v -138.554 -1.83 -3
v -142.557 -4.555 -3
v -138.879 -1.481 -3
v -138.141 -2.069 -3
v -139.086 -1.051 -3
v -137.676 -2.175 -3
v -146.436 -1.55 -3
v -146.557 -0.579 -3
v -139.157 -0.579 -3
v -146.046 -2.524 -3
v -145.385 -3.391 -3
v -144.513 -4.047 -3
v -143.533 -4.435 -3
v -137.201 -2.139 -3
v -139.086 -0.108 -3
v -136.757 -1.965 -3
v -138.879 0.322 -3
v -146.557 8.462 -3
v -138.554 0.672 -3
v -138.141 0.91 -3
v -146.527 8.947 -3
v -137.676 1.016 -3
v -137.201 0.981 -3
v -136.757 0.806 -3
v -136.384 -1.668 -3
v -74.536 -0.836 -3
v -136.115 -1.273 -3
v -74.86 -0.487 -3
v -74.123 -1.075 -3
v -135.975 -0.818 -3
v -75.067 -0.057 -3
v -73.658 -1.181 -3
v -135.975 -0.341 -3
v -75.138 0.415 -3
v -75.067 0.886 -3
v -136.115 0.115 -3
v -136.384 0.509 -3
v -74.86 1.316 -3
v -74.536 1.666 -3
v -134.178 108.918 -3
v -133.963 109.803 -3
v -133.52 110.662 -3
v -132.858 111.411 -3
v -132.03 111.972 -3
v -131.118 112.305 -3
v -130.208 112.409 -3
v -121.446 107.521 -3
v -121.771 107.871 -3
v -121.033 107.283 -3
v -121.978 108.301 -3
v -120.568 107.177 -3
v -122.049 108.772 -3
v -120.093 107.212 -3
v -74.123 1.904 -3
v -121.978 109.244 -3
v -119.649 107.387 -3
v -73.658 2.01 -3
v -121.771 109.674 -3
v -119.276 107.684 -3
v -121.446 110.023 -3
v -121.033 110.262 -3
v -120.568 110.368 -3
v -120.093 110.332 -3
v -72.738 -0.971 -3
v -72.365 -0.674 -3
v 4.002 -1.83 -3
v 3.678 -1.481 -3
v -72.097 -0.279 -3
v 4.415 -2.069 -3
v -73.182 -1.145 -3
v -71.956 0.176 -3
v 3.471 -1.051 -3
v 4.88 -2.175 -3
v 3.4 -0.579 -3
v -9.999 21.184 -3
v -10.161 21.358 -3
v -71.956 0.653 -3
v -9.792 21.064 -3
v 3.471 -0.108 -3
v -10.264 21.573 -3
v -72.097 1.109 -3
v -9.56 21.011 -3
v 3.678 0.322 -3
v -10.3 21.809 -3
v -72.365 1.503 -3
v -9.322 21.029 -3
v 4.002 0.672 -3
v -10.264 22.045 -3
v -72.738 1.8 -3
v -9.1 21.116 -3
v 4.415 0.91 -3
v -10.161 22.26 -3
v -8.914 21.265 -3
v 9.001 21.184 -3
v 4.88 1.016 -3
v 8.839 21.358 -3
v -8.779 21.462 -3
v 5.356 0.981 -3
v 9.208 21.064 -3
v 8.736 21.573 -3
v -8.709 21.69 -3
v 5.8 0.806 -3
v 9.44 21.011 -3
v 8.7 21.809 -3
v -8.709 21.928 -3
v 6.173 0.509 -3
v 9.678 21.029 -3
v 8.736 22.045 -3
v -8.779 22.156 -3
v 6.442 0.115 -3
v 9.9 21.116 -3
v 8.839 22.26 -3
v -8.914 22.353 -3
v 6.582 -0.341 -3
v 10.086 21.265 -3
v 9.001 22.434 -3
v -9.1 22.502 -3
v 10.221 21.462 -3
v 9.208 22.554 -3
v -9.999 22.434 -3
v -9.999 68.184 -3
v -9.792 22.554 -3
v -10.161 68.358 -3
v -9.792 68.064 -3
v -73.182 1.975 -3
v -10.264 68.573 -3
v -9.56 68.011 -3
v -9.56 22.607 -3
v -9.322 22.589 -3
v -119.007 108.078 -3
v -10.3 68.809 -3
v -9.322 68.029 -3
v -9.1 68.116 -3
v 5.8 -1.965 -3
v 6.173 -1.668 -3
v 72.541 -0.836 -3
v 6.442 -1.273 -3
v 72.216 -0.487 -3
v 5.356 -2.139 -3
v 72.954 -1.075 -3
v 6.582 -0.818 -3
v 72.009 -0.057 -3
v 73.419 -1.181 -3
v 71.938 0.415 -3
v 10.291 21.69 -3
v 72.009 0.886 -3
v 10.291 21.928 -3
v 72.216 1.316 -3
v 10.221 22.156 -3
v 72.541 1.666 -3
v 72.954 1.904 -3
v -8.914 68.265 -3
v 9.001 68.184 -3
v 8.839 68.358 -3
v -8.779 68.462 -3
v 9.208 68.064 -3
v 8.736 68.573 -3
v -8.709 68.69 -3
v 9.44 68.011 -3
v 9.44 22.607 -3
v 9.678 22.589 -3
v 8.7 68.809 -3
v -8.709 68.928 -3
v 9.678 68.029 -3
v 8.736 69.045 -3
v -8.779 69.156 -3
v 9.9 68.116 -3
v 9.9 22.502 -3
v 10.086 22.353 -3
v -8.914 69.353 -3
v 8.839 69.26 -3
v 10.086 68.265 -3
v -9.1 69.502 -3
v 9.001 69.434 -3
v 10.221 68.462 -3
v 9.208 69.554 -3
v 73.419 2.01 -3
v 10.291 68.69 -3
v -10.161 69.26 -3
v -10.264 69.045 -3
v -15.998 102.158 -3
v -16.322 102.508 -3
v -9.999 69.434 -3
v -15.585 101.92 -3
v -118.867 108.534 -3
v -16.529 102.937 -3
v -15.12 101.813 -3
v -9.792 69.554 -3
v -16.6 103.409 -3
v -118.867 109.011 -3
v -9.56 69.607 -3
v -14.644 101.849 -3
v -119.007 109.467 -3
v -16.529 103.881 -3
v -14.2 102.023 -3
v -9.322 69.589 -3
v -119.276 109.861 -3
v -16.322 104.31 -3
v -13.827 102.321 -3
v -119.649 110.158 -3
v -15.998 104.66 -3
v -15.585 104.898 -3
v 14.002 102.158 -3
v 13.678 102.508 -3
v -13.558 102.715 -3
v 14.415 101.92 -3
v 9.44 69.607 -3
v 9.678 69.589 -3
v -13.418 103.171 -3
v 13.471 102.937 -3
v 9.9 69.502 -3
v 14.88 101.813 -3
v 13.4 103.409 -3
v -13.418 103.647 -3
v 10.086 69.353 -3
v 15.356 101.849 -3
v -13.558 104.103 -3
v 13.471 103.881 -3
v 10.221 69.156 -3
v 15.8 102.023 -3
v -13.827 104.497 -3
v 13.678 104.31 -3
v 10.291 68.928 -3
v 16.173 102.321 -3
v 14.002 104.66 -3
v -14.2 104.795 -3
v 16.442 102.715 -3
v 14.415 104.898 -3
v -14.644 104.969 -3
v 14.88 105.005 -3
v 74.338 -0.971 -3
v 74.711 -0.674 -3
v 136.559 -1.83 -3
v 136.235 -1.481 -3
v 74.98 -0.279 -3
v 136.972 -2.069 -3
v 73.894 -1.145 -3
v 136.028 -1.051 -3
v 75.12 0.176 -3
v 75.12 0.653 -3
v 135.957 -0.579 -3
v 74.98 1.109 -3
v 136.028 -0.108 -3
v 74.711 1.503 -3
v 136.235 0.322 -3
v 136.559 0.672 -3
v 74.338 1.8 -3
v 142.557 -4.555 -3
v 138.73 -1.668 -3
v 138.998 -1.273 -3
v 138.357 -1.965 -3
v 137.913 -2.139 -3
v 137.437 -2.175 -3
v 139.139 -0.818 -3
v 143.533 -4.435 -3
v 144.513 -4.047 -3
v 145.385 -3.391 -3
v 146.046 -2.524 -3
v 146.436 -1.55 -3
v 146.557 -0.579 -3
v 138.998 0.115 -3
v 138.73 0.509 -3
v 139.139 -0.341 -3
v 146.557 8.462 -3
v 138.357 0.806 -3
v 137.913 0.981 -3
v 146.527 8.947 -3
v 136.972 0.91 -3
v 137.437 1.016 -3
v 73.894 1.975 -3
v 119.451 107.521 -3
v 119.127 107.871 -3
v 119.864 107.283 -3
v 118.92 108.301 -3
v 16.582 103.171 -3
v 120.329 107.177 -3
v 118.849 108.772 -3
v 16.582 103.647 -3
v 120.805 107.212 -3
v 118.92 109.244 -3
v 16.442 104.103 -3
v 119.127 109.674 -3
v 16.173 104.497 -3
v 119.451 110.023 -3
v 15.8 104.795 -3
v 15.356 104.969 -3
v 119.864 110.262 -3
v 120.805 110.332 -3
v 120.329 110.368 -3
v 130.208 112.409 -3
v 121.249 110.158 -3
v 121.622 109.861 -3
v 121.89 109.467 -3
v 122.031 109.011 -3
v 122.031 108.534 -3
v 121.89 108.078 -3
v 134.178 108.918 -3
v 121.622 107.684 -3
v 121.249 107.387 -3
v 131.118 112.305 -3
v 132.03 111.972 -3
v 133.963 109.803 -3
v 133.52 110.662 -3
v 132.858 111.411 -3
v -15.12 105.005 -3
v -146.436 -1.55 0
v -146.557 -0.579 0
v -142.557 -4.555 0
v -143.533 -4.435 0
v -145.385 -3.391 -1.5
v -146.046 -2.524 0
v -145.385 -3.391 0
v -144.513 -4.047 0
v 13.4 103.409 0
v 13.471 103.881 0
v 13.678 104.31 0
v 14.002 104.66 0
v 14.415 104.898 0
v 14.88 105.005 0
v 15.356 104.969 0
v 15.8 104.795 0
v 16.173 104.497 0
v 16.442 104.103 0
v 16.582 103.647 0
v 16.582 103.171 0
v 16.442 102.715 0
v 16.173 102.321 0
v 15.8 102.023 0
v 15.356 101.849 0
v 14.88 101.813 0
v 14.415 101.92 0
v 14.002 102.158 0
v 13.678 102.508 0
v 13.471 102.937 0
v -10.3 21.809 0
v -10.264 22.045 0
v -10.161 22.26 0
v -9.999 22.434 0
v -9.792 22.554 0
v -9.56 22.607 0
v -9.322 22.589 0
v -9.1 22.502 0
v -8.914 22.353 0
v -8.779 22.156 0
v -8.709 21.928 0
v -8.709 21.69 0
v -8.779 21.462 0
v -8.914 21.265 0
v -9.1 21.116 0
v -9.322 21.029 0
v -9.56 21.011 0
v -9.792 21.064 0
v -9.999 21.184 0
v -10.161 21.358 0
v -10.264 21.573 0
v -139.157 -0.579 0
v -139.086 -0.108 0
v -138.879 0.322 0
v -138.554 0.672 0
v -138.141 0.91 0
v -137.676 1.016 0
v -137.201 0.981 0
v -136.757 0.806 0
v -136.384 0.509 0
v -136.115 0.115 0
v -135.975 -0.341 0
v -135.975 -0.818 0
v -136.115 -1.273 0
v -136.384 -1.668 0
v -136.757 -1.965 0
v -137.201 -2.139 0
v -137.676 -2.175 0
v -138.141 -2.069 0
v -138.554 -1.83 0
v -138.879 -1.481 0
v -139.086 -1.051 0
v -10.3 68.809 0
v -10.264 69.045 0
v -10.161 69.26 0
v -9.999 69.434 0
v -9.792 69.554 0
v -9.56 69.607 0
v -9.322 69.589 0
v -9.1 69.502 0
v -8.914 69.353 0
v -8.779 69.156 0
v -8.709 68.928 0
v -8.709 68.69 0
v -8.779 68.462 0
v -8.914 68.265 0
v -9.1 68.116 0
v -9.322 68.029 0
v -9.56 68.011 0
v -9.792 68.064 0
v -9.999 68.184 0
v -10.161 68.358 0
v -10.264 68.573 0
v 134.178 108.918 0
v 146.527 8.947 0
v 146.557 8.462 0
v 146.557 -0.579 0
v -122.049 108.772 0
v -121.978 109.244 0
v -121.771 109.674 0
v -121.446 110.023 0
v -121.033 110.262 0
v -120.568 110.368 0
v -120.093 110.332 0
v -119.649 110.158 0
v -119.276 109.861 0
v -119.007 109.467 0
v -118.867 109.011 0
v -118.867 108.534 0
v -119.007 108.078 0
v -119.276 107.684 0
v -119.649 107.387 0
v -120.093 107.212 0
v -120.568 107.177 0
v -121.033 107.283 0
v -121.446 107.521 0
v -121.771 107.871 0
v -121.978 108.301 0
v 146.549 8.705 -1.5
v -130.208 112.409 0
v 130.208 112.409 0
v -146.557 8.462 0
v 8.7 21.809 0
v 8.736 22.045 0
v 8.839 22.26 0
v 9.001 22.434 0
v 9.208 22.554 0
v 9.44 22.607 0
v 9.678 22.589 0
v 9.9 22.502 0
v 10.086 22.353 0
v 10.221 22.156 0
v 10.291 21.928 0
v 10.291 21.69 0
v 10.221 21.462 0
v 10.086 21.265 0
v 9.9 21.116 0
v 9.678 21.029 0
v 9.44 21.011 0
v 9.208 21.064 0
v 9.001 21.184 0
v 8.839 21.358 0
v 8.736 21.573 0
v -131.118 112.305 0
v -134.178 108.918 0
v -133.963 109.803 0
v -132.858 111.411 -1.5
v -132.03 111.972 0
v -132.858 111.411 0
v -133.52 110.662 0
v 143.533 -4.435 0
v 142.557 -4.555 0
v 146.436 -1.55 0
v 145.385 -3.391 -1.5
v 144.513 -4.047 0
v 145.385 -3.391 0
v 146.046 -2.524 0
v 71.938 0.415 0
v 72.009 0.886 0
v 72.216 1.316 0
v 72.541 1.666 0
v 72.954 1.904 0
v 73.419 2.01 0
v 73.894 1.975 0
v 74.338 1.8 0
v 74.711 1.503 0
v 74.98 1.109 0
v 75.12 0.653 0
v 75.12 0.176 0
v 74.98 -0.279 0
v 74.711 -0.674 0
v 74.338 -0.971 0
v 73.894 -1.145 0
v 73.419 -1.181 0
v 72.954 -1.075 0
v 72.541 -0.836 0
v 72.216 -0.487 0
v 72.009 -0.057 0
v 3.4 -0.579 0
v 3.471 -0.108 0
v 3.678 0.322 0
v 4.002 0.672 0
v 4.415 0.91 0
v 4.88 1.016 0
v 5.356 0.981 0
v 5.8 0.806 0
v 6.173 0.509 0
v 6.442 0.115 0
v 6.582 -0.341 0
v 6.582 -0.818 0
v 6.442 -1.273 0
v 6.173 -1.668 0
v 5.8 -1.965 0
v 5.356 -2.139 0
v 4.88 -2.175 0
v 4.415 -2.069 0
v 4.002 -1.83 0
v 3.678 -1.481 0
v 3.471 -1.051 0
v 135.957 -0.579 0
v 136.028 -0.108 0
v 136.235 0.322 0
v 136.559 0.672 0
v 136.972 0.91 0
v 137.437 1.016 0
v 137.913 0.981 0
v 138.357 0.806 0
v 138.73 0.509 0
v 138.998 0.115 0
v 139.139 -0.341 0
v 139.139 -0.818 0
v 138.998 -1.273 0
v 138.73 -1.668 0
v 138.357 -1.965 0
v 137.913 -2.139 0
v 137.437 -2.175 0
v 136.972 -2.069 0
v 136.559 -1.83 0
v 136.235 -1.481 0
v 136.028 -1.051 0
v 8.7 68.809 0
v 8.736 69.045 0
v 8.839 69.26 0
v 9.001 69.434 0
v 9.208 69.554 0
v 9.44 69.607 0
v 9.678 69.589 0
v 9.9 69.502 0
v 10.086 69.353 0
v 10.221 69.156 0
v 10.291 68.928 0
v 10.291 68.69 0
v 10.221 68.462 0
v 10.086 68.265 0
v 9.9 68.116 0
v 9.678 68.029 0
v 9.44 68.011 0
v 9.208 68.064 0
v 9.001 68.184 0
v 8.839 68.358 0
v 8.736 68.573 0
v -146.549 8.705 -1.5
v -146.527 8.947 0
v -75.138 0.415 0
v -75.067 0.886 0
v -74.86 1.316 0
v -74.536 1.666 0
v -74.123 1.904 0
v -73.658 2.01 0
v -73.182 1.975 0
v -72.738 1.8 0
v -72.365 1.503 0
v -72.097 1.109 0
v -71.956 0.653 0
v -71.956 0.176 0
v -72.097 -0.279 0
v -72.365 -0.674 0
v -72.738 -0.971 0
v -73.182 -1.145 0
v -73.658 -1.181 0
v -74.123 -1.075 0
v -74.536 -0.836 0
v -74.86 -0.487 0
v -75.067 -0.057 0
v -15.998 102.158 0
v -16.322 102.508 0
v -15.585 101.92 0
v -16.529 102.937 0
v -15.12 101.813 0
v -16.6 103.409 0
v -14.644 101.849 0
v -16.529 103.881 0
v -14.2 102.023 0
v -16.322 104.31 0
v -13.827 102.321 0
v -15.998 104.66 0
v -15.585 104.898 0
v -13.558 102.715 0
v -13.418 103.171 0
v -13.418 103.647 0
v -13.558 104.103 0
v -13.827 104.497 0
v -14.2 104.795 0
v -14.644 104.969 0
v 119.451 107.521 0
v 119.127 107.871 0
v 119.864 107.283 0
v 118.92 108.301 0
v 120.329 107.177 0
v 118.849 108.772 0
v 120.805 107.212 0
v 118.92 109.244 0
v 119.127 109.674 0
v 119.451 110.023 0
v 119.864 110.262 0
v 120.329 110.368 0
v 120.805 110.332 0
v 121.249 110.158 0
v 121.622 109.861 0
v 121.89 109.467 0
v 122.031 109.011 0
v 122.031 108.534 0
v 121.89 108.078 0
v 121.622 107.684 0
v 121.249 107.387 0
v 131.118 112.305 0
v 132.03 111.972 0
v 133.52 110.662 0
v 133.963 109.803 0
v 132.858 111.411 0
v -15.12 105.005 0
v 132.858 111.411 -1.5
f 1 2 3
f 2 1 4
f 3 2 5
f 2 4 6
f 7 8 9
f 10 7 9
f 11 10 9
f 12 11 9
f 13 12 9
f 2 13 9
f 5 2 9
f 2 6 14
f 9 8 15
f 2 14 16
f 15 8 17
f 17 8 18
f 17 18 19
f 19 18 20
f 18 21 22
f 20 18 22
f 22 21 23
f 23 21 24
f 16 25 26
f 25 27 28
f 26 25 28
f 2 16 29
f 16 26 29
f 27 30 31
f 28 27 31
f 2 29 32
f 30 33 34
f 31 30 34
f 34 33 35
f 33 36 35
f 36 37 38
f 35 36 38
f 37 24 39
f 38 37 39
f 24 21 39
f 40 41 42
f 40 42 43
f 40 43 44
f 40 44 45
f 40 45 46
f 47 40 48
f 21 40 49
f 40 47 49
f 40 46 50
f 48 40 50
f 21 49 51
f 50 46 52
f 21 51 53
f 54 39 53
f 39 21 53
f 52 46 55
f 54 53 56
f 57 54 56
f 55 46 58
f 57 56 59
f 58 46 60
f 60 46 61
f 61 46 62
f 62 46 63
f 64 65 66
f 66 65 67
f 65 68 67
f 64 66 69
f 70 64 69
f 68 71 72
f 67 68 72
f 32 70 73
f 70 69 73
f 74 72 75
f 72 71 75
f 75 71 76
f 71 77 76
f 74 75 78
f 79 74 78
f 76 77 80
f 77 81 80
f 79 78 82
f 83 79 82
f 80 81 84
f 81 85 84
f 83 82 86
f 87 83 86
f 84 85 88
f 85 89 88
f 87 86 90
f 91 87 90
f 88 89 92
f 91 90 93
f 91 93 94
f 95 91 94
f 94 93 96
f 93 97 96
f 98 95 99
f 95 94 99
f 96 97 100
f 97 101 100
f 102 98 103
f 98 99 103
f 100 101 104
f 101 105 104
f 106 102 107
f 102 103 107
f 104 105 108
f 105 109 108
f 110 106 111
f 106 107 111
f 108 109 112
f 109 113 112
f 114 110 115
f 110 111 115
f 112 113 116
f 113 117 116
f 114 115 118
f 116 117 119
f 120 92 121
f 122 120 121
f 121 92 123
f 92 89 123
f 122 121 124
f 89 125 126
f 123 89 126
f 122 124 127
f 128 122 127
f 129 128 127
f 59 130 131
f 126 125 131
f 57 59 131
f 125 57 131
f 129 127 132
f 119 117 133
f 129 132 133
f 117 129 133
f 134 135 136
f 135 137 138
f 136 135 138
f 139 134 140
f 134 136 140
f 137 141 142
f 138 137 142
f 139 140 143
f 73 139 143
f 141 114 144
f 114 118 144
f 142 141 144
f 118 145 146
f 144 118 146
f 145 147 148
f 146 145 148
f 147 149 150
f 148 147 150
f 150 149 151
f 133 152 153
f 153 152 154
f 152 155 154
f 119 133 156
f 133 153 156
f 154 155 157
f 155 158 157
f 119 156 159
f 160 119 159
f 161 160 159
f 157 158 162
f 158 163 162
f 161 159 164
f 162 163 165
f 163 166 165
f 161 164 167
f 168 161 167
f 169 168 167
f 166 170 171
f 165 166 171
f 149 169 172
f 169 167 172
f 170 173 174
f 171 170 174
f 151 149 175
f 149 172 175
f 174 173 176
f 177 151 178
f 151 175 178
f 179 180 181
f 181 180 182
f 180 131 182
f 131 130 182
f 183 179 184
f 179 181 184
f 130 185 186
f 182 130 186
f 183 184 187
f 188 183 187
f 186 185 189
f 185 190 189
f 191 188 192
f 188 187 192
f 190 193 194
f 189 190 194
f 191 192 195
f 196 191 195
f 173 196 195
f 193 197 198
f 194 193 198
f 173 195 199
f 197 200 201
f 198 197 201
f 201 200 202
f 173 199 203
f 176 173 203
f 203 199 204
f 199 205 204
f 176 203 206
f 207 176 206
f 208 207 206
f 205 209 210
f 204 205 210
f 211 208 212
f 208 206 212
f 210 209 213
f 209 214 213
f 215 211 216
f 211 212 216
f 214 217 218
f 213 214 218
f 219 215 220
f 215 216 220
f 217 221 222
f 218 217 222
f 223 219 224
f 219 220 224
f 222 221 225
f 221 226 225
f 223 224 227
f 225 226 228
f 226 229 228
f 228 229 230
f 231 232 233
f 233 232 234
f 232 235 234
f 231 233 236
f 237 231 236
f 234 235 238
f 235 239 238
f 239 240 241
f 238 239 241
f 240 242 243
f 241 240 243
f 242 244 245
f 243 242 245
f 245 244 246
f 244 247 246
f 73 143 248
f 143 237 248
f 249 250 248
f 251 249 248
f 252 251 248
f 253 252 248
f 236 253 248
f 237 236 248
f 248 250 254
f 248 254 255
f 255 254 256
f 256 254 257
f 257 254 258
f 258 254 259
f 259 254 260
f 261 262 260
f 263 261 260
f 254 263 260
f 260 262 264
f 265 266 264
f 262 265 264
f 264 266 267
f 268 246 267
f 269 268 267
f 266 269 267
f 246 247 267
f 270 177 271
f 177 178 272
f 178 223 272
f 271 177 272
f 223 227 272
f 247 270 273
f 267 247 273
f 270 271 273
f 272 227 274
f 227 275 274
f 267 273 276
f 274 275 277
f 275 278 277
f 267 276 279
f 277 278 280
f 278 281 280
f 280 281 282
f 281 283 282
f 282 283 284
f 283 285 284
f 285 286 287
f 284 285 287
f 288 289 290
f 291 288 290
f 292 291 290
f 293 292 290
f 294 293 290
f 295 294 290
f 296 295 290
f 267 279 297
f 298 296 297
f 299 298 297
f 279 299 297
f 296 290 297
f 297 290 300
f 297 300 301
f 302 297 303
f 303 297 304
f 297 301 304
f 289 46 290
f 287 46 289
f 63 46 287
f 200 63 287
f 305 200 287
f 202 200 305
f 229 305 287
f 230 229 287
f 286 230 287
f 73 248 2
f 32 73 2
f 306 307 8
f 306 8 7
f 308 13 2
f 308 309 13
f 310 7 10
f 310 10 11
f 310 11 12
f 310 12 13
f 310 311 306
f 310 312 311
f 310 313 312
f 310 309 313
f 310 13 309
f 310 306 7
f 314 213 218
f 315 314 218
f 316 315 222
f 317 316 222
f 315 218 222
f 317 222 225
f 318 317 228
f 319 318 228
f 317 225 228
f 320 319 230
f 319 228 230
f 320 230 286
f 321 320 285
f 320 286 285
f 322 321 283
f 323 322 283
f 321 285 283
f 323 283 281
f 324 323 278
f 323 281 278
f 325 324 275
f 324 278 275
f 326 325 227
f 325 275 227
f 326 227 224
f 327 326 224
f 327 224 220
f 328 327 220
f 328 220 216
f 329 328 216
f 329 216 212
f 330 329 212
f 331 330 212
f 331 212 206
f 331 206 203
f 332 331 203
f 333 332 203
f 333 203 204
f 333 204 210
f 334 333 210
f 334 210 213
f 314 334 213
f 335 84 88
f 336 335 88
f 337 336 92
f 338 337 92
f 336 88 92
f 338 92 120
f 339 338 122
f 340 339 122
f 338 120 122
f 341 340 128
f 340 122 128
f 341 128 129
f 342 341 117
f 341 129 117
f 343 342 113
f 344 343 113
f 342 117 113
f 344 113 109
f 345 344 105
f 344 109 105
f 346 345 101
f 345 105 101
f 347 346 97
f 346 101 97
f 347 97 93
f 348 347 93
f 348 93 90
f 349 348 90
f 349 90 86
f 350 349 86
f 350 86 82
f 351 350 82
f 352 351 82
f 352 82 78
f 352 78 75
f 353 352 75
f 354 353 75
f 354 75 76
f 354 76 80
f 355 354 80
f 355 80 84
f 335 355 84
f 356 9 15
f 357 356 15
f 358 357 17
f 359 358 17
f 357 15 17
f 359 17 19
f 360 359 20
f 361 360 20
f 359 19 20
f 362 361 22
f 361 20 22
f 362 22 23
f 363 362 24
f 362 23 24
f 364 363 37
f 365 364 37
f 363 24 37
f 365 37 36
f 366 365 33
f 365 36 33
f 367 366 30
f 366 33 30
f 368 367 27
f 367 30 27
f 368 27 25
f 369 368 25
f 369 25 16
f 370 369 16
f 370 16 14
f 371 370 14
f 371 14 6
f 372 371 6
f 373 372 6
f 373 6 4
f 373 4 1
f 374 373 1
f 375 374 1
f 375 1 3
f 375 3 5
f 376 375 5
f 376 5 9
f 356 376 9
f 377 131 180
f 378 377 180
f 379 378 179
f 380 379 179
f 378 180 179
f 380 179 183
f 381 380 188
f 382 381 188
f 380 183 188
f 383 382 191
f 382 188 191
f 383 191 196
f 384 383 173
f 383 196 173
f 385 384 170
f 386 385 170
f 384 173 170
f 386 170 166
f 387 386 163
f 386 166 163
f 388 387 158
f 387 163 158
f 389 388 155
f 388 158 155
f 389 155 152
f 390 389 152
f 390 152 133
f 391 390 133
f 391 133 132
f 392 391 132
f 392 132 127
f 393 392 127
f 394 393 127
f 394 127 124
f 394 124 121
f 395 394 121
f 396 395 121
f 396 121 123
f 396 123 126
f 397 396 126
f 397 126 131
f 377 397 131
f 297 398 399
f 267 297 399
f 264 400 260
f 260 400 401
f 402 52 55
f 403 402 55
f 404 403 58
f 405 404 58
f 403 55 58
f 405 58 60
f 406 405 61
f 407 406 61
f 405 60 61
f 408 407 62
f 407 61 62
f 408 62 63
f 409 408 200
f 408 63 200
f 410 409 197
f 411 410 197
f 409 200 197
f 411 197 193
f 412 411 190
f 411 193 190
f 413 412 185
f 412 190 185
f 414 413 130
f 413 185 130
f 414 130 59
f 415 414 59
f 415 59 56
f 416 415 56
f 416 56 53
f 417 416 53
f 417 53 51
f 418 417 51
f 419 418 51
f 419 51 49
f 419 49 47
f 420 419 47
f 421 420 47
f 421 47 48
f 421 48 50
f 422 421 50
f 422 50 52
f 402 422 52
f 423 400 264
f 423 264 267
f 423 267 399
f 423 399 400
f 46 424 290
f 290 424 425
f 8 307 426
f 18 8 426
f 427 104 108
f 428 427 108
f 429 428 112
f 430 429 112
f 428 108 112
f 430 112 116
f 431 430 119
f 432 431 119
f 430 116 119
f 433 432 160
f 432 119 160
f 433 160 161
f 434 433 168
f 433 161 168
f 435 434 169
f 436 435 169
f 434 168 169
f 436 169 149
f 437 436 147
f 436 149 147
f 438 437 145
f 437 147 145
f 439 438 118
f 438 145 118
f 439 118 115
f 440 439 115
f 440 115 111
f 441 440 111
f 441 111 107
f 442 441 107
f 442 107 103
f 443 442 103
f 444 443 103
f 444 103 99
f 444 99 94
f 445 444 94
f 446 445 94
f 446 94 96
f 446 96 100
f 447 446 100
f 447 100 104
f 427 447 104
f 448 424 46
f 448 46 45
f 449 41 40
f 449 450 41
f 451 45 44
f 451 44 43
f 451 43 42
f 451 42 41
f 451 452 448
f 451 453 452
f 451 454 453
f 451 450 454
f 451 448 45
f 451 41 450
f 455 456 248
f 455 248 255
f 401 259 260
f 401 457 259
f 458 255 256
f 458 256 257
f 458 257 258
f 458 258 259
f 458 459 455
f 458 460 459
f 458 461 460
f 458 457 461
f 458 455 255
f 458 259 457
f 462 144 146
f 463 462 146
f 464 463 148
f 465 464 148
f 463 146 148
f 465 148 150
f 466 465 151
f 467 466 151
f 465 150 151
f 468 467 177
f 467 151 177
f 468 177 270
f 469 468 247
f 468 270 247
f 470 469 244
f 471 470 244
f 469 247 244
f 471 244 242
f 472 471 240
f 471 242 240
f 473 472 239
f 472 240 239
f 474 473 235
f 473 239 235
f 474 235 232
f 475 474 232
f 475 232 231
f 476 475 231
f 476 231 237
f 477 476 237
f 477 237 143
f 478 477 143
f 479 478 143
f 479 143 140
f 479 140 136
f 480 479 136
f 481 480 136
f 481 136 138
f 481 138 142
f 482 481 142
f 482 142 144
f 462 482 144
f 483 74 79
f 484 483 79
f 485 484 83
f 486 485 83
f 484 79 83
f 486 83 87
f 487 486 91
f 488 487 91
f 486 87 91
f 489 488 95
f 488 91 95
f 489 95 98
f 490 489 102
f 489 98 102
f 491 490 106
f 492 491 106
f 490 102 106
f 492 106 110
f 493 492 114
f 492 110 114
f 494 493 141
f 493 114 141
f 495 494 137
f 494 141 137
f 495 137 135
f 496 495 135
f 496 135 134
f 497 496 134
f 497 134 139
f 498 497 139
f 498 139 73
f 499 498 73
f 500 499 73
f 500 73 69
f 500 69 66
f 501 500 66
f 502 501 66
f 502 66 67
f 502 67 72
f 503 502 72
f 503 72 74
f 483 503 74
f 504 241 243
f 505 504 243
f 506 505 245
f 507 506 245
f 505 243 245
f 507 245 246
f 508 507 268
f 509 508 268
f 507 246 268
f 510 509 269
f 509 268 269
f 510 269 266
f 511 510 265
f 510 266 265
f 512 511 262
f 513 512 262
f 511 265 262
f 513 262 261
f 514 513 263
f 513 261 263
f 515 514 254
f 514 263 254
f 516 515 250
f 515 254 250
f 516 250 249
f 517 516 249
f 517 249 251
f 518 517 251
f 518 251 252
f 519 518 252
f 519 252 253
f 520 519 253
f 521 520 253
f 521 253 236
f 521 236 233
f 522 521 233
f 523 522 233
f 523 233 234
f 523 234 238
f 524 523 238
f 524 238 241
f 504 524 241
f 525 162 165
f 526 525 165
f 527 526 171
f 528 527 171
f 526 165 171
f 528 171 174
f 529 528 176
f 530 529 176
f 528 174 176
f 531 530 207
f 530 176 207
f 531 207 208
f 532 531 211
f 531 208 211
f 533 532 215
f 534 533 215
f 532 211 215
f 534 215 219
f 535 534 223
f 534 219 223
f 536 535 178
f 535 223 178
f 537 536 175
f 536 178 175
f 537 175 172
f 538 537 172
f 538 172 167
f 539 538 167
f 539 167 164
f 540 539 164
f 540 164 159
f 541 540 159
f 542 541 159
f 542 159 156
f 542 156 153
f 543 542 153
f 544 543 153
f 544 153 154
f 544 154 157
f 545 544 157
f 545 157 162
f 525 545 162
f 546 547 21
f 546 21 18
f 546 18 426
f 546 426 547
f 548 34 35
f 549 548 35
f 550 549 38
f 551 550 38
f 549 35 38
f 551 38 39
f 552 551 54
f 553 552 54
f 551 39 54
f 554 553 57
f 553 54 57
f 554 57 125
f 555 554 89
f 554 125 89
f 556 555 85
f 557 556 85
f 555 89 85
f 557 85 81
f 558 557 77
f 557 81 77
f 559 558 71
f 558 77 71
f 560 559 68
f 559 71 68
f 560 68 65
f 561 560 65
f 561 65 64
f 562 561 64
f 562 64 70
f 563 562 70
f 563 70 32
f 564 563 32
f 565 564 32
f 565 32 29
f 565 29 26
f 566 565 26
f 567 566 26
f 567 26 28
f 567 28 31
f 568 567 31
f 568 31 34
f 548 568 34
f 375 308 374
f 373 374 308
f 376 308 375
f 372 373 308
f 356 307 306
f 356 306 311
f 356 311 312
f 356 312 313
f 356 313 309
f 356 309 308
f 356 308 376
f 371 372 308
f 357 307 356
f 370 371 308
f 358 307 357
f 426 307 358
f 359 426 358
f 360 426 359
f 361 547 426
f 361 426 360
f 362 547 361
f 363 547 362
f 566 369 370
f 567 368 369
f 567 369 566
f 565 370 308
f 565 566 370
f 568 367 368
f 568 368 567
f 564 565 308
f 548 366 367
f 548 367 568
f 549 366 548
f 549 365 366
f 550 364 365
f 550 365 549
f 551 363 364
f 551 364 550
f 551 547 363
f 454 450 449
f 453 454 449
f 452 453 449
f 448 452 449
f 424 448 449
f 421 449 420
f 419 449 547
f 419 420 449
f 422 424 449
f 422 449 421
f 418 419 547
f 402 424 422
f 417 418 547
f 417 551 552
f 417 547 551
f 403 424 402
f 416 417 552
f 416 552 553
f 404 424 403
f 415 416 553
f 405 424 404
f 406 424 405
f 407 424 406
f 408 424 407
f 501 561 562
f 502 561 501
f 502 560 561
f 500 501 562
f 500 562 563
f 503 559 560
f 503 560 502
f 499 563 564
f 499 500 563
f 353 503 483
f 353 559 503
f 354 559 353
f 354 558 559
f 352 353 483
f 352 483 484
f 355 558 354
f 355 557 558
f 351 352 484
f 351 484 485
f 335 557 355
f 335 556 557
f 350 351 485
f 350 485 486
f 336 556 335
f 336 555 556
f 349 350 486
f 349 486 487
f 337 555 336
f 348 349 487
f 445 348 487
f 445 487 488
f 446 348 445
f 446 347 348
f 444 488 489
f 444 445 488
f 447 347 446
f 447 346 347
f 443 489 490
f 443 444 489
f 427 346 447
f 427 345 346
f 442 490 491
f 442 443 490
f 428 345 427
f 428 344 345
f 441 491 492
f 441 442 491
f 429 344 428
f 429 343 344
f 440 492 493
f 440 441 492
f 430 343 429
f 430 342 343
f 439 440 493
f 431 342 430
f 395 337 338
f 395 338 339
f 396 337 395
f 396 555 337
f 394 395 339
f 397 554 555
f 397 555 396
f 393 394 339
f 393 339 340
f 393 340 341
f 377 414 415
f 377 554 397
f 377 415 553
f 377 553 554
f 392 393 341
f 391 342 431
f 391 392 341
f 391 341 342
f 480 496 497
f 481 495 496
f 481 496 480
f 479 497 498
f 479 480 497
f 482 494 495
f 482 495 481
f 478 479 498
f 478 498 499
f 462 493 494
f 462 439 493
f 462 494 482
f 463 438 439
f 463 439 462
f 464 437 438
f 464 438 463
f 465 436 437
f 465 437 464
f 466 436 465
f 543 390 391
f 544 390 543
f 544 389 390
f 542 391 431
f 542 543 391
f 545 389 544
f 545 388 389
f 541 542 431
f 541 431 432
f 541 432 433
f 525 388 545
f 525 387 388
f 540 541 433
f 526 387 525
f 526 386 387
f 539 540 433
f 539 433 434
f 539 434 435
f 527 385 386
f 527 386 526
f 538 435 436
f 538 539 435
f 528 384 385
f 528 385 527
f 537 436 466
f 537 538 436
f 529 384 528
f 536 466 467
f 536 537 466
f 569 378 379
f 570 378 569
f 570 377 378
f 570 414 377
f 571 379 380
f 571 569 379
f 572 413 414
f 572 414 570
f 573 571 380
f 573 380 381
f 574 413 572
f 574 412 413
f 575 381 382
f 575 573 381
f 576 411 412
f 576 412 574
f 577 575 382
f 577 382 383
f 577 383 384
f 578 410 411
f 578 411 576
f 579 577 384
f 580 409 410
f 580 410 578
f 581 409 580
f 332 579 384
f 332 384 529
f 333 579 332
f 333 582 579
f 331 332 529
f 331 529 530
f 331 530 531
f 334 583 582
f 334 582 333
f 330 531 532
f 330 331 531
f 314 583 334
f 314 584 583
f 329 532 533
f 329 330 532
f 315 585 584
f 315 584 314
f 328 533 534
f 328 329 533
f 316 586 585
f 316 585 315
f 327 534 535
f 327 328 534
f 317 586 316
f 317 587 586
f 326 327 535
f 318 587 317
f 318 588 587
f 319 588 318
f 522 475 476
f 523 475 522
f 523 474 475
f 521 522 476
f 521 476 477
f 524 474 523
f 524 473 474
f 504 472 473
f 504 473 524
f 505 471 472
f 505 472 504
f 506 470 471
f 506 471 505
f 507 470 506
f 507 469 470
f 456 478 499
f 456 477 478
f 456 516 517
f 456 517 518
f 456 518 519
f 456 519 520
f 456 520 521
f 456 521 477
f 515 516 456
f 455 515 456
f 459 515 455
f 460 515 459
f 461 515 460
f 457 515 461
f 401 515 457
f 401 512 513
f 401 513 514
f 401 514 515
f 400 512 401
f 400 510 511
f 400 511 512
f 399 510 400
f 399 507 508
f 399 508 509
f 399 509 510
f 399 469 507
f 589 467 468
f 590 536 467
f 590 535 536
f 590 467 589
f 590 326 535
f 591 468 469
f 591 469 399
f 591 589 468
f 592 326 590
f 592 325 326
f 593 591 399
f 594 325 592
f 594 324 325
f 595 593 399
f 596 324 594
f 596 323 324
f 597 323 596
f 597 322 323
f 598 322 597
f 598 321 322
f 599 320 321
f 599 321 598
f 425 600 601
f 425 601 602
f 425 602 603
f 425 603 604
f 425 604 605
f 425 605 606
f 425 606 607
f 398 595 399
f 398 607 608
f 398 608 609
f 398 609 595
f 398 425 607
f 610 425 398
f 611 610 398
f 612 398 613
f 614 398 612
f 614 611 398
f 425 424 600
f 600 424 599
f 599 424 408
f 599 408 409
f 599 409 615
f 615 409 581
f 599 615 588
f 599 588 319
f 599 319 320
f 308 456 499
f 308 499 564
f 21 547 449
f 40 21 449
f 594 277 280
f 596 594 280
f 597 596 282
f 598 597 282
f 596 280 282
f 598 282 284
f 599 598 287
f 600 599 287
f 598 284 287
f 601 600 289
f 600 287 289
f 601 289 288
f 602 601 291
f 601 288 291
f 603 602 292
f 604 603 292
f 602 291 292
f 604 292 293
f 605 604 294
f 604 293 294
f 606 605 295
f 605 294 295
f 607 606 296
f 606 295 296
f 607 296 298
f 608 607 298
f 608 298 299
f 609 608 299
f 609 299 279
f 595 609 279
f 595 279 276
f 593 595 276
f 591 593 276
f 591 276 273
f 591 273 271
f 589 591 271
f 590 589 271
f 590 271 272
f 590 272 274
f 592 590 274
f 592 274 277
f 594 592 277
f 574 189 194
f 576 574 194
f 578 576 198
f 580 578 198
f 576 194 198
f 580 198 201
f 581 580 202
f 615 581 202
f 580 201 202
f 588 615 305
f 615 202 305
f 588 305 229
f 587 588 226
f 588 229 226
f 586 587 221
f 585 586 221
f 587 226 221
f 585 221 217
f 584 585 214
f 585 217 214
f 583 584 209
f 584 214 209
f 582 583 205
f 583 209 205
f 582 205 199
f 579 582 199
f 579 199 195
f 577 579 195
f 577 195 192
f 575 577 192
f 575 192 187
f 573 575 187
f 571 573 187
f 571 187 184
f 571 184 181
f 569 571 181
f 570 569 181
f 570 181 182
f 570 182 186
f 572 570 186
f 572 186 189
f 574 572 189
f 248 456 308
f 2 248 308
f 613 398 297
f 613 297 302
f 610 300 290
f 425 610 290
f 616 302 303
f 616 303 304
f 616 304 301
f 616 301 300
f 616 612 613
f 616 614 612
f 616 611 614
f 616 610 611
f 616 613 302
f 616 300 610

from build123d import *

# Parameters (mm, degrees)
BOSS_EXTRUDE1_DEPTH            = 3
F_3_2_3_2_DIAMETER_HOLE1_D     = 3.2
F_3_2_3_2_DIAMETER_HOLE1_DEPTH = 15
F_3_2_3_2_DIAMETER_HOLE1_TIP   = 0.96137699
F_1_6_1_6_DIAMETER_HOLE1_D     = 1.6
F_1_6_1_6_DIAMETER_HOLE1_DEPTH = 15
F_1_6_1_6_DIAMETER_HOLE1_TIP   = 0.480688495


with BuildPart() as part:
    # Sketch1 → Boss-Extrude1 (new body)
    with BuildSketch(Plane.XY):
        with BuildLine():
            Line((-11.618950039, 112.409005395), (11.618950039, 112.409005395))
            Line((11.618950039, 112.409005395), (130.207854482, 112.409005395))
            add(Edge.make_bspline(
                [(134.178039088, 108.917568146), (133.74675554, 112.409005395), (130.207854482, 112.409005395)],
                knots=[0.122173048, 0.122173048, 0.122173048, 1.570796327, 1.570796327, 1.570796327], degree=2, weights=[1, 0.748955721, 1]))
            Line((134.178039088, 108.917568146), (146.527006833, 8.947035697))
            add(Edge.make_bspline(
                [(146.556822227, 8.462484609), (146.556822227, 8.705666473), (146.527006833, 8.947035697)],
                knots=[0, 0, 0, 0.122173048, 0.122173048, 0.122173048], degree=2, weights=[1, 0.998134798, 1]))
            Line((146.556822227, 8.462484609), (146.556822227, -0.579261565))
            add(Edge.make_bspline(
                [(142.556822227, -4.555249901), (146.556822227, -4.555249901), (146.556822227, -0.579261565)],
                knots=[4.71238898, 4.71238898, 4.71238898, 6.283185307, 6.283185307, 6.283185307], degree=2, weights=[1, 0.707106781, 1]))
            Line((142.556822227, -4.555249901), (-142.556822227, -4.555249901))
            add(Edge.make_bspline(
                [(-146.556822227, -0.579261565), (-146.556822227, -4.555249901), (-142.556822227, -4.555249901)],
                knots=[3.141592654, 3.141592654, 3.141592654, 4.71238898, 4.71238898, 4.71238898], degree=2, weights=[1, 0.707106781, 1]))
            Line((-146.556822227, -0.579261565), (-146.556822227, 8.462484609))
            add(Edge.make_bspline(
                [(-146.527006833, 8.947035697), (-146.556822227, 8.705666473), (-146.556822227, 8.462484609)],
                knots=[3.019419606, 3.019419606, 3.019419606, 3.141592654, 3.141592654, 3.141592654], degree=2, weights=[1, 0.998134798, 1]))
            Line((-146.527006833, 8.947035697), (-134.178039088, 108.917568146))
            add(Edge.make_bspline(
                [(-130.207854482, 112.409005395), (-133.74675554, 112.409005395), (-134.178039088, 108.917568146)],
                knots=[1.570796327, 1.570796327, 1.570796327, 3.019419606, 3.019419606, 3.019419606], degree=2, weights=[1, 0.748955721, 1]))
            Line((-130.207854482, 112.409005395), (-11.618950039, 112.409005395))
        make_face()
    extrude(amount=-BOSS_EXTRUDE1_DEPTH)

    # Ø3.2 (3.2) Diameter Hole1
    with Locations(Plane(origin=(167.519332635, 69.709864468, 0), x_dir=(1, 0, 0), z_dir=(0, 0, 1))):
        with Locations((-47.07064809, 39.062428571), (-29.962510408, -70.289126033), (-93.981129185, -69.295128949), (-241.057536085, -69.295128949), (-305.076154862, -70.289126033), (-287.968017181, 39.062428571), (-182.519332635, 33.699140926), (-152.519332635, 33.699140926), (-162.519332635, -70.289126033)):
            Hole(F_3_2_3_2_DIAMETER_HOLE1_D / 2, depth=F_3_2_3_2_DIAMETER_HOLE1_DEPTH)
            with Locations((0, 0, -(F_3_2_3_2_DIAMETER_HOLE1_DEPTH + F_3_2_3_2_DIAMETER_HOLE1_TIP / 2))):  # 118° drill point
                Cone(0, F_3_2_3_2_DIAMETER_HOLE1_D / 2, F_3_2_3_2_DIAMETER_HOLE1_TIP, mode=Mode.SUBTRACT)

    # Ø1.6 (1.6) Diameter Hole1
    with Locations(Plane.XY):
        with Locations((-9.5, 68.809005395), (9.5, 68.809005395), (-9.5, 21.809005395), (9.5, 21.809005395)):
            Hole(F_1_6_1_6_DIAMETER_HOLE1_D / 2, depth=F_1_6_1_6_DIAMETER_HOLE1_DEPTH)
            with Locations((0, 0, -(F_1_6_1_6_DIAMETER_HOLE1_DEPTH + F_1_6_1_6_DIAMETER_HOLE1_TIP / 2))):  # 118° drill point
                Cone(0, F_1_6_1_6_DIAMETER_HOLE1_D / 2, F_1_6_1_6_DIAMETER_HOLE1_TIP, mode=Mode.SUBTRACT)


solid = part.part
